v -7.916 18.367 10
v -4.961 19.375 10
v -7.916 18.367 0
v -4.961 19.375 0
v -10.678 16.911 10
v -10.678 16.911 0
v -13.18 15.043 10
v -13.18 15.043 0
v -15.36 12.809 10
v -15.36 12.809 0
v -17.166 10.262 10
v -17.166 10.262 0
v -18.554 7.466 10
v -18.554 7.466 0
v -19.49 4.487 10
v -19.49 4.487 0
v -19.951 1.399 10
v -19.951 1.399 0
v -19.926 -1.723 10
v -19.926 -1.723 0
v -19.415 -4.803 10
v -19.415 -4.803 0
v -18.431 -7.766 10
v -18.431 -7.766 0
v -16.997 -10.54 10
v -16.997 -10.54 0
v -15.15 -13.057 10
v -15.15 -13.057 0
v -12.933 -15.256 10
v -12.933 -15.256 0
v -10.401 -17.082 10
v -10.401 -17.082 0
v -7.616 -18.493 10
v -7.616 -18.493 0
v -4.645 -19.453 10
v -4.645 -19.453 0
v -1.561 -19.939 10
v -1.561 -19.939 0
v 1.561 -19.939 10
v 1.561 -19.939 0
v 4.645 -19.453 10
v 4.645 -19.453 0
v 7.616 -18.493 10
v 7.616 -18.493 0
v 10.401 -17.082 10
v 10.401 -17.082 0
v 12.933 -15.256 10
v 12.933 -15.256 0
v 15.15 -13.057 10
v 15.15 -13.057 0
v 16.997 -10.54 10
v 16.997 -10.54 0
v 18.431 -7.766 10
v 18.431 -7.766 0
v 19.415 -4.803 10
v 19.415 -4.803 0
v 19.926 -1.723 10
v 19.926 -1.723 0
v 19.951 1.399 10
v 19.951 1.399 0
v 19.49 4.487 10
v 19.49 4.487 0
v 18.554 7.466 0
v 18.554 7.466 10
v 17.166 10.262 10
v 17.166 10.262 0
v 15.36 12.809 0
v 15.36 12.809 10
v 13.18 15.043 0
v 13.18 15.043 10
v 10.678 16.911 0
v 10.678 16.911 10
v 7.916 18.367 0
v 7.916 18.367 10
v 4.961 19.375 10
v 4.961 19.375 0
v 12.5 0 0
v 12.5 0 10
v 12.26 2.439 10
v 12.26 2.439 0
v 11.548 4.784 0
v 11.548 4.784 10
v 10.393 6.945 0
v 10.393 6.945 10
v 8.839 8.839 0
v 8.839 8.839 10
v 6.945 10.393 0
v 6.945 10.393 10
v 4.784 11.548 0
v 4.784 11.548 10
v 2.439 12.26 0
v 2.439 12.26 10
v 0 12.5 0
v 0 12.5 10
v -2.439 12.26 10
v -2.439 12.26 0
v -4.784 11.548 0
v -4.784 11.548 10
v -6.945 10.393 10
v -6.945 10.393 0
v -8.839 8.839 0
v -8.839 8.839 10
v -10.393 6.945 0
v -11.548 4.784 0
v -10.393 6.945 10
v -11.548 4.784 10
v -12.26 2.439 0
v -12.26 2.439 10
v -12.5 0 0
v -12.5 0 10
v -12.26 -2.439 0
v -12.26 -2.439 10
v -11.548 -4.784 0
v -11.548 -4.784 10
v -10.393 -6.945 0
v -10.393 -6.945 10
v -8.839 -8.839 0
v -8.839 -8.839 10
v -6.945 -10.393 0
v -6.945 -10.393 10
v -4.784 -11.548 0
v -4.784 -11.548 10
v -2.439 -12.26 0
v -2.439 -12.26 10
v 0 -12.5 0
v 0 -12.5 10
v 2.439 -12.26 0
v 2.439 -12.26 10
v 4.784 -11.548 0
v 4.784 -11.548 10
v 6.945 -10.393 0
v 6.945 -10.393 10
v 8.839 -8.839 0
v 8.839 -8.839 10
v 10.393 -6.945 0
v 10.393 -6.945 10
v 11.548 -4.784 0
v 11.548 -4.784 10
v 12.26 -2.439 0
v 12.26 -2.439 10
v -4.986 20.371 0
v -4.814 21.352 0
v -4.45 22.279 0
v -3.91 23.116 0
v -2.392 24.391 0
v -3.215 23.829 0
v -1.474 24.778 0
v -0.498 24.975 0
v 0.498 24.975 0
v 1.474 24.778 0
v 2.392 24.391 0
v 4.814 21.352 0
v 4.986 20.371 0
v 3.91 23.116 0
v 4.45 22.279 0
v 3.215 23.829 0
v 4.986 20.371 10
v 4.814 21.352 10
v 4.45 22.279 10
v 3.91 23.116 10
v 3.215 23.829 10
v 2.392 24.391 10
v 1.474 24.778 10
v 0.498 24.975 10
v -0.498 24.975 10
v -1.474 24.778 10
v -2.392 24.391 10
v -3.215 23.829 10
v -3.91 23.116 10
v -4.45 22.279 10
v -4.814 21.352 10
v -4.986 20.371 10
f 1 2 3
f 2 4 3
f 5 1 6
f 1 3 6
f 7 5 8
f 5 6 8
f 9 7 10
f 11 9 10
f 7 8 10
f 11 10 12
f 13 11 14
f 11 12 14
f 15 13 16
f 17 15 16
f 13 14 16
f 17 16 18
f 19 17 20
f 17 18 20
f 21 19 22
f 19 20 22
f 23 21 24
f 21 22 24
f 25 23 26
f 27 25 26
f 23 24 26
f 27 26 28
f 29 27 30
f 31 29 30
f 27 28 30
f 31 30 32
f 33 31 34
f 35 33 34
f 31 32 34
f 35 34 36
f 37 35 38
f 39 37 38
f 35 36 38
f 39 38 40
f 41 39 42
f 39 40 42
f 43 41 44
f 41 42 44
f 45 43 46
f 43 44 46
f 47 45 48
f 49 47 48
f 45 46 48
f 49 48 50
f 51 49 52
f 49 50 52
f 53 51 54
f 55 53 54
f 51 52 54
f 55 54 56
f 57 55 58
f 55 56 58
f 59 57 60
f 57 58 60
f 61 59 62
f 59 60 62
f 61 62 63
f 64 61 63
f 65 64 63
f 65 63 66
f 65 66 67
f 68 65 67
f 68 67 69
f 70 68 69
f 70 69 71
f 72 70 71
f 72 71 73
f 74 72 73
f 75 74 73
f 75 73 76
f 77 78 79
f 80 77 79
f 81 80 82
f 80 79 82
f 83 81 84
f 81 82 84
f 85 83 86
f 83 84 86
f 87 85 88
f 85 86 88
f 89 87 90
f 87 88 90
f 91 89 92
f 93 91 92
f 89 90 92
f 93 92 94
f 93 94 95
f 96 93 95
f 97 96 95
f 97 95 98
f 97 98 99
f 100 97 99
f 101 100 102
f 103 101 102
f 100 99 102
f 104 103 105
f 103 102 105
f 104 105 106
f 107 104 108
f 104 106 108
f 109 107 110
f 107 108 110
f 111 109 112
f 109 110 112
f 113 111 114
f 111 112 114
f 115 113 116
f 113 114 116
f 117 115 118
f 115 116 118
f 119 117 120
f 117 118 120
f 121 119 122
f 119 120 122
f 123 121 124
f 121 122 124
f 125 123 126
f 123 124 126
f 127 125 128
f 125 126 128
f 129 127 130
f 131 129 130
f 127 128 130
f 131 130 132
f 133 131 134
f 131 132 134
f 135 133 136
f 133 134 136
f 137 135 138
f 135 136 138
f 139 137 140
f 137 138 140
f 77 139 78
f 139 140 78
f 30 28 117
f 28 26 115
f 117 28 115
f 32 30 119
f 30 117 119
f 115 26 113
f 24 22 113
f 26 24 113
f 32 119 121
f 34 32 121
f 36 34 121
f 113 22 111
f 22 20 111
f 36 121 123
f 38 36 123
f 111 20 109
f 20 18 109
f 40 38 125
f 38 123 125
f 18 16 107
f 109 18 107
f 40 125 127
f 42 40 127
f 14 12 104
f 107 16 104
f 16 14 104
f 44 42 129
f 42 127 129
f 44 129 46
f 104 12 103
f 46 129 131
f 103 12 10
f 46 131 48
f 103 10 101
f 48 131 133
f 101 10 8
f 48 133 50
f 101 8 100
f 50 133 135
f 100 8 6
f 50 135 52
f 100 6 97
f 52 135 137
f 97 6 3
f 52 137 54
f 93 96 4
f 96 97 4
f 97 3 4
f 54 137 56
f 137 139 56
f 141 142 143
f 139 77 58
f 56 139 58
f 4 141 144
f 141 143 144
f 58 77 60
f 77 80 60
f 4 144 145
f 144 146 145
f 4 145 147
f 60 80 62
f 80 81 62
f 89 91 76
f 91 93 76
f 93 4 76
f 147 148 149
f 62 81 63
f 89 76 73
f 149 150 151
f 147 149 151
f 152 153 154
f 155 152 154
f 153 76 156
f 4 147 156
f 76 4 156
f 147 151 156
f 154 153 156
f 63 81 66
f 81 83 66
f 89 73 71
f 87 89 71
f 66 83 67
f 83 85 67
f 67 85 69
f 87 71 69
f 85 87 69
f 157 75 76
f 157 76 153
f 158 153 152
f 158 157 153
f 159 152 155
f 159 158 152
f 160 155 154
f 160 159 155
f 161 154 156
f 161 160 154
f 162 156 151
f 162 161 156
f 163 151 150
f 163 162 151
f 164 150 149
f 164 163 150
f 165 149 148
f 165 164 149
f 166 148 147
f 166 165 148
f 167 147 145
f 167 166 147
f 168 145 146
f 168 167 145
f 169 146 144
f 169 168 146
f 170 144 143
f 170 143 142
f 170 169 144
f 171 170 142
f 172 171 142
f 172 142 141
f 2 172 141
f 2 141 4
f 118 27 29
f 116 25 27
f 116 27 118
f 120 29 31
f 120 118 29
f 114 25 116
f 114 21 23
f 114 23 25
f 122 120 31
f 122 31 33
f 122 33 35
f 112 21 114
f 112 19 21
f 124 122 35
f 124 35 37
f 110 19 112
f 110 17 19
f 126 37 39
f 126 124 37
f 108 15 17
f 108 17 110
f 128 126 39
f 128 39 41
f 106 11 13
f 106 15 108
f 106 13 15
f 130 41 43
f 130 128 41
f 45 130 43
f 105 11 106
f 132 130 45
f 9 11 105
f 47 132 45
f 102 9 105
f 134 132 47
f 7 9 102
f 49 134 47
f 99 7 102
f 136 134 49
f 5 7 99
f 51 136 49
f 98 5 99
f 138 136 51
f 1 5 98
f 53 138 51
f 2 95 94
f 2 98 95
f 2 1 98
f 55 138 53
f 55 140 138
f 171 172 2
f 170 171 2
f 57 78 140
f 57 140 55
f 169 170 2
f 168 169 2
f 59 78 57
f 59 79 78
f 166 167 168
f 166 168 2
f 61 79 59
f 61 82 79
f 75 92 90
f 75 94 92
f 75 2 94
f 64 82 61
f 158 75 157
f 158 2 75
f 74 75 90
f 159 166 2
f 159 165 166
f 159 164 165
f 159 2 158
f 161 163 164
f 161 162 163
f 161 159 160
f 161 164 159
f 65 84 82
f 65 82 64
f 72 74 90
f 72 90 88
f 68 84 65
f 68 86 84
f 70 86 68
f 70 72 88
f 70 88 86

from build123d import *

# Parameters (mm, degrees)
F0_R     = 20
F1_DEPTH = 10
F2_R     = 12.5
F3_DEPTH = 10
F4_R     = 5
F5_DEPTH = 10


with BuildPart() as f1:
    # F0 (on Top) → F1 (new body)
    with BuildSketch(Plane.XY):
        Circle(F0_R)
    extrude(amount=F1_DEPTH)

    # F2 (on face) → F3 (cut)
    with BuildSketch(Plane.XY.offset(10)):
        Circle(F2_R)
    extrude(amount=-F3_DEPTH, mode=Mode.SUBTRACT)

    # F4 (on face) → F5 (join, through all)
    with BuildSketch(Plane.XY.offset(10)):
        with Locations((0, 20)):
            Circle(F4_R)
    extrude(amount=-F5_DEPTH)


solid = f1.part
